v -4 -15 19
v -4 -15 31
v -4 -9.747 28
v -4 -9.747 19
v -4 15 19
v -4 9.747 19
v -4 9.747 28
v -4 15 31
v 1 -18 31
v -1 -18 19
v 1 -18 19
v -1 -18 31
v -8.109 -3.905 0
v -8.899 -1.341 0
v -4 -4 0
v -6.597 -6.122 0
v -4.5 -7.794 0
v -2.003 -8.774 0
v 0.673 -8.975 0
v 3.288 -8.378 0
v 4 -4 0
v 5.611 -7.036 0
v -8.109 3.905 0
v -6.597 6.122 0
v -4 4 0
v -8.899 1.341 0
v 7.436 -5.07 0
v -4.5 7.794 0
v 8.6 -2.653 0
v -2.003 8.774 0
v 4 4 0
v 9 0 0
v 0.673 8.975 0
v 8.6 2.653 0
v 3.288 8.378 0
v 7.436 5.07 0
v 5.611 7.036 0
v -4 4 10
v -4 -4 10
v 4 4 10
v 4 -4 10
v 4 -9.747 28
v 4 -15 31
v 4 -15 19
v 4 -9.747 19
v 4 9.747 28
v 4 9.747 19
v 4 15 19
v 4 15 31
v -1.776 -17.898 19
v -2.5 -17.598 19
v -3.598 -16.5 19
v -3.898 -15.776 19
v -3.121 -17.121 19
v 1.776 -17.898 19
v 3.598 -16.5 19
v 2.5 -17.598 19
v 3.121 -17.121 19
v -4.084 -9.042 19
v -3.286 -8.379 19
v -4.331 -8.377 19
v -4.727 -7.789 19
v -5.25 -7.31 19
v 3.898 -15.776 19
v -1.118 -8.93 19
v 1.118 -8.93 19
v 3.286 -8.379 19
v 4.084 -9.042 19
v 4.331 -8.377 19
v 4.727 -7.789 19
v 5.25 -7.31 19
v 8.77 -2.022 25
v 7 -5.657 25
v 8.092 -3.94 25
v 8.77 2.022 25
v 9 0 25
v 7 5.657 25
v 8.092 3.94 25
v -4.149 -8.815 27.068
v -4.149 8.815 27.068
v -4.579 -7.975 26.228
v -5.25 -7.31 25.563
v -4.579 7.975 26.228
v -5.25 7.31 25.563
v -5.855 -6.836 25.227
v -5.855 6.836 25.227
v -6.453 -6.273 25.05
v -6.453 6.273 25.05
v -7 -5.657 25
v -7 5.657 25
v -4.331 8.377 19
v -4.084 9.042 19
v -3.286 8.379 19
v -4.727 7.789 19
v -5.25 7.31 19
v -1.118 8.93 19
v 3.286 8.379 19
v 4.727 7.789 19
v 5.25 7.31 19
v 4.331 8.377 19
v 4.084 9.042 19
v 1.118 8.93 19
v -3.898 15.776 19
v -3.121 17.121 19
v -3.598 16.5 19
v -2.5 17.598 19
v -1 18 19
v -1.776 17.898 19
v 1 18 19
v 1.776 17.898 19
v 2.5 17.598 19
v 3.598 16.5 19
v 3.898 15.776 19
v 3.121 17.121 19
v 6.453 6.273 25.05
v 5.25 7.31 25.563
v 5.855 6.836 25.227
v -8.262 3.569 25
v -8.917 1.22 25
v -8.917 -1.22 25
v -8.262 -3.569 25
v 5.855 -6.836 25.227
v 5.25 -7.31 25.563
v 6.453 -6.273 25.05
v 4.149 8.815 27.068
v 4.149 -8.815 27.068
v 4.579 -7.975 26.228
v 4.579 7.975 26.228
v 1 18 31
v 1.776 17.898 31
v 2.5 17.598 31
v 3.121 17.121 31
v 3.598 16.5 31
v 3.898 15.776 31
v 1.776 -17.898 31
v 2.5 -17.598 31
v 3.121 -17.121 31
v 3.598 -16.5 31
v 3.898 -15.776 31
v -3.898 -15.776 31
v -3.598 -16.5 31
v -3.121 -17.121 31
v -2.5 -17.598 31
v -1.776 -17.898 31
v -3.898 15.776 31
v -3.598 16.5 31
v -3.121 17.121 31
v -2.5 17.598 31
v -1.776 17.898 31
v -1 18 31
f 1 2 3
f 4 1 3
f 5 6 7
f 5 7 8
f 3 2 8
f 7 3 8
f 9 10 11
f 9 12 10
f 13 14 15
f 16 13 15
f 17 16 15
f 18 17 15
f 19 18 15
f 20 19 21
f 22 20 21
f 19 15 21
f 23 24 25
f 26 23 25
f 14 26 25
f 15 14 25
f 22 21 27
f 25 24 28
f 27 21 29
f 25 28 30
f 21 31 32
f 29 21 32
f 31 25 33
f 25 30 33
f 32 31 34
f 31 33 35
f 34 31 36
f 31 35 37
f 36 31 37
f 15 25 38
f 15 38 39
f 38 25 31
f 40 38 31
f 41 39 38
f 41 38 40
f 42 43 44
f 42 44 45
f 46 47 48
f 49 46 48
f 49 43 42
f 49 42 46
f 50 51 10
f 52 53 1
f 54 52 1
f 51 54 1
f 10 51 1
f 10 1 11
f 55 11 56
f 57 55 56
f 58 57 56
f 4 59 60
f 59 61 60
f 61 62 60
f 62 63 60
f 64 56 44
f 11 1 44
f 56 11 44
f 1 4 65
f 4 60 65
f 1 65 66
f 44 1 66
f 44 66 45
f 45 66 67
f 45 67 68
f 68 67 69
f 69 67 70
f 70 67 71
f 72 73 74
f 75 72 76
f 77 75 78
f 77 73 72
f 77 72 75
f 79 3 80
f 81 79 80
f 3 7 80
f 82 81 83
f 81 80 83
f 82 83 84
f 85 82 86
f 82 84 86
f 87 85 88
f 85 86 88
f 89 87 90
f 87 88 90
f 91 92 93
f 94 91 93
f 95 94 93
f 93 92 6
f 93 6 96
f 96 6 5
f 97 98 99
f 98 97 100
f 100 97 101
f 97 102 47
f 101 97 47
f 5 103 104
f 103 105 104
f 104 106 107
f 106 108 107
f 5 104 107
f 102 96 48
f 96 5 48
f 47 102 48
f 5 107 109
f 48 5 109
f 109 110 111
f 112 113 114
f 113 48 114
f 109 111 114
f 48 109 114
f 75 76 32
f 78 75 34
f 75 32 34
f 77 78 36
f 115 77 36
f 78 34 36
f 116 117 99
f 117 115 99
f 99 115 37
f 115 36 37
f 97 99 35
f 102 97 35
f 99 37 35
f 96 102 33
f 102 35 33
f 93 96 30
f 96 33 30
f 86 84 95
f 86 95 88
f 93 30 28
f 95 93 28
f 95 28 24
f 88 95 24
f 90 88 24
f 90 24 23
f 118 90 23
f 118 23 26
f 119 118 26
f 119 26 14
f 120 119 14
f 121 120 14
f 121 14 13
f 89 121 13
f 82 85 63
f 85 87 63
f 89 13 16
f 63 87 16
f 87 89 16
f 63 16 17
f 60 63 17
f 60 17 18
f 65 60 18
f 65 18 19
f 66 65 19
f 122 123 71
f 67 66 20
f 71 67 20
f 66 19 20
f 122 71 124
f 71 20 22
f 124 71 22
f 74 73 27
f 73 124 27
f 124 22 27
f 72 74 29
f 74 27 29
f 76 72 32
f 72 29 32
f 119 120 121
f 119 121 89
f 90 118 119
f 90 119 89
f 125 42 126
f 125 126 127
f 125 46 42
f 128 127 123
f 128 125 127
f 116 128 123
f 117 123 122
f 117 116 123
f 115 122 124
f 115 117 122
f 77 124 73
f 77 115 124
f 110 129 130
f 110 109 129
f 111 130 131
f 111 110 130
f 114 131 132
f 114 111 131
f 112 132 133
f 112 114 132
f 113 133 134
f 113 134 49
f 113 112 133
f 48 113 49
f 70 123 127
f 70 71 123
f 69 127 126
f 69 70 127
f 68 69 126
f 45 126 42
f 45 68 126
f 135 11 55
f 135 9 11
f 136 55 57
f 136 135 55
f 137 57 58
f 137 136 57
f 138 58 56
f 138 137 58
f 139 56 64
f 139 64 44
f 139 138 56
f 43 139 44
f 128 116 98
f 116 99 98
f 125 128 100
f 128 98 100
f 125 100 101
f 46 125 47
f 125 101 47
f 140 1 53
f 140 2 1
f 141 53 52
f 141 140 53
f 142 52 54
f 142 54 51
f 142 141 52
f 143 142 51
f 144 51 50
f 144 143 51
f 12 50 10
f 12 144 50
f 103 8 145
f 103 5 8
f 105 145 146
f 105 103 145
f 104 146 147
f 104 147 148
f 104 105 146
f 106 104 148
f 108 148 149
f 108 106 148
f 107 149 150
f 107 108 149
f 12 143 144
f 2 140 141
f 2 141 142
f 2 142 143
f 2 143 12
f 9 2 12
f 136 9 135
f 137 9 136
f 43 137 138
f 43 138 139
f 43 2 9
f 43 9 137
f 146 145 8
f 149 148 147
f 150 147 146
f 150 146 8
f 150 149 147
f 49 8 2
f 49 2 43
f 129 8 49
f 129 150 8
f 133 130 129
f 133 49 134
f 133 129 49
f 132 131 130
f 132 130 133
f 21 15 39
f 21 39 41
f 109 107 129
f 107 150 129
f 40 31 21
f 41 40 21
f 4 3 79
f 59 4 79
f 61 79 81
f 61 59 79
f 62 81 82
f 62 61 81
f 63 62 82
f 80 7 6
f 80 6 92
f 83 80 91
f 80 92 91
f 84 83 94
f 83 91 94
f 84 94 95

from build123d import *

# Parameters (mm, degrees)
F0_R     = 9
F1_DEPTH = 25
F2_W     = 8
F2_H     = 8
F3_DEPTH = 10
F4_W     = 8
F4_H     = 36
F5_DEPTH = 6
F6_R     = 3


with BuildPart() as f1:
    # F0 (on Top) → F1 (new body)
    with BuildSketch(Plane.XY):
        Circle(F0_R)
    extrude(amount=F1_DEPTH)

    # F2 (on face) → F3 (cut)
    with BuildSketch(Plane(origin=(0, 0, 0), x_dir=(1, 0, 0), z_dir=(0, 0, -1))):
        Rectangle(F2_W, F2_H)
    extrude(amount=-F3_DEPTH, mode=Mode.SUBTRACT)

    # F4 (on face) → F5 (join, symmetric)
    with BuildSketch(Plane.XY.offset(25)):
        Rectangle(F4_W, F4_H)
    extrude(amount=F5_DEPTH, both=True)

    # F6
    f6_edges = [f1.edges().sort_by_distance(p)[0] for p in [
        (-4, 18, 25),
        (4, 18, 25),
        (-4, -18, 25),
        (4, -18, 25),
        (-4, 0, 25),
        (-4, -8.062258, 22),
        (-4, 8.062258, 22),
        (4, -8.062258, 22),
        (4, 8.062258, 22),
        (4, 0, 25),
    ]]
    fillet(f6_edges, radius=F6_R)


solid = f1.part
